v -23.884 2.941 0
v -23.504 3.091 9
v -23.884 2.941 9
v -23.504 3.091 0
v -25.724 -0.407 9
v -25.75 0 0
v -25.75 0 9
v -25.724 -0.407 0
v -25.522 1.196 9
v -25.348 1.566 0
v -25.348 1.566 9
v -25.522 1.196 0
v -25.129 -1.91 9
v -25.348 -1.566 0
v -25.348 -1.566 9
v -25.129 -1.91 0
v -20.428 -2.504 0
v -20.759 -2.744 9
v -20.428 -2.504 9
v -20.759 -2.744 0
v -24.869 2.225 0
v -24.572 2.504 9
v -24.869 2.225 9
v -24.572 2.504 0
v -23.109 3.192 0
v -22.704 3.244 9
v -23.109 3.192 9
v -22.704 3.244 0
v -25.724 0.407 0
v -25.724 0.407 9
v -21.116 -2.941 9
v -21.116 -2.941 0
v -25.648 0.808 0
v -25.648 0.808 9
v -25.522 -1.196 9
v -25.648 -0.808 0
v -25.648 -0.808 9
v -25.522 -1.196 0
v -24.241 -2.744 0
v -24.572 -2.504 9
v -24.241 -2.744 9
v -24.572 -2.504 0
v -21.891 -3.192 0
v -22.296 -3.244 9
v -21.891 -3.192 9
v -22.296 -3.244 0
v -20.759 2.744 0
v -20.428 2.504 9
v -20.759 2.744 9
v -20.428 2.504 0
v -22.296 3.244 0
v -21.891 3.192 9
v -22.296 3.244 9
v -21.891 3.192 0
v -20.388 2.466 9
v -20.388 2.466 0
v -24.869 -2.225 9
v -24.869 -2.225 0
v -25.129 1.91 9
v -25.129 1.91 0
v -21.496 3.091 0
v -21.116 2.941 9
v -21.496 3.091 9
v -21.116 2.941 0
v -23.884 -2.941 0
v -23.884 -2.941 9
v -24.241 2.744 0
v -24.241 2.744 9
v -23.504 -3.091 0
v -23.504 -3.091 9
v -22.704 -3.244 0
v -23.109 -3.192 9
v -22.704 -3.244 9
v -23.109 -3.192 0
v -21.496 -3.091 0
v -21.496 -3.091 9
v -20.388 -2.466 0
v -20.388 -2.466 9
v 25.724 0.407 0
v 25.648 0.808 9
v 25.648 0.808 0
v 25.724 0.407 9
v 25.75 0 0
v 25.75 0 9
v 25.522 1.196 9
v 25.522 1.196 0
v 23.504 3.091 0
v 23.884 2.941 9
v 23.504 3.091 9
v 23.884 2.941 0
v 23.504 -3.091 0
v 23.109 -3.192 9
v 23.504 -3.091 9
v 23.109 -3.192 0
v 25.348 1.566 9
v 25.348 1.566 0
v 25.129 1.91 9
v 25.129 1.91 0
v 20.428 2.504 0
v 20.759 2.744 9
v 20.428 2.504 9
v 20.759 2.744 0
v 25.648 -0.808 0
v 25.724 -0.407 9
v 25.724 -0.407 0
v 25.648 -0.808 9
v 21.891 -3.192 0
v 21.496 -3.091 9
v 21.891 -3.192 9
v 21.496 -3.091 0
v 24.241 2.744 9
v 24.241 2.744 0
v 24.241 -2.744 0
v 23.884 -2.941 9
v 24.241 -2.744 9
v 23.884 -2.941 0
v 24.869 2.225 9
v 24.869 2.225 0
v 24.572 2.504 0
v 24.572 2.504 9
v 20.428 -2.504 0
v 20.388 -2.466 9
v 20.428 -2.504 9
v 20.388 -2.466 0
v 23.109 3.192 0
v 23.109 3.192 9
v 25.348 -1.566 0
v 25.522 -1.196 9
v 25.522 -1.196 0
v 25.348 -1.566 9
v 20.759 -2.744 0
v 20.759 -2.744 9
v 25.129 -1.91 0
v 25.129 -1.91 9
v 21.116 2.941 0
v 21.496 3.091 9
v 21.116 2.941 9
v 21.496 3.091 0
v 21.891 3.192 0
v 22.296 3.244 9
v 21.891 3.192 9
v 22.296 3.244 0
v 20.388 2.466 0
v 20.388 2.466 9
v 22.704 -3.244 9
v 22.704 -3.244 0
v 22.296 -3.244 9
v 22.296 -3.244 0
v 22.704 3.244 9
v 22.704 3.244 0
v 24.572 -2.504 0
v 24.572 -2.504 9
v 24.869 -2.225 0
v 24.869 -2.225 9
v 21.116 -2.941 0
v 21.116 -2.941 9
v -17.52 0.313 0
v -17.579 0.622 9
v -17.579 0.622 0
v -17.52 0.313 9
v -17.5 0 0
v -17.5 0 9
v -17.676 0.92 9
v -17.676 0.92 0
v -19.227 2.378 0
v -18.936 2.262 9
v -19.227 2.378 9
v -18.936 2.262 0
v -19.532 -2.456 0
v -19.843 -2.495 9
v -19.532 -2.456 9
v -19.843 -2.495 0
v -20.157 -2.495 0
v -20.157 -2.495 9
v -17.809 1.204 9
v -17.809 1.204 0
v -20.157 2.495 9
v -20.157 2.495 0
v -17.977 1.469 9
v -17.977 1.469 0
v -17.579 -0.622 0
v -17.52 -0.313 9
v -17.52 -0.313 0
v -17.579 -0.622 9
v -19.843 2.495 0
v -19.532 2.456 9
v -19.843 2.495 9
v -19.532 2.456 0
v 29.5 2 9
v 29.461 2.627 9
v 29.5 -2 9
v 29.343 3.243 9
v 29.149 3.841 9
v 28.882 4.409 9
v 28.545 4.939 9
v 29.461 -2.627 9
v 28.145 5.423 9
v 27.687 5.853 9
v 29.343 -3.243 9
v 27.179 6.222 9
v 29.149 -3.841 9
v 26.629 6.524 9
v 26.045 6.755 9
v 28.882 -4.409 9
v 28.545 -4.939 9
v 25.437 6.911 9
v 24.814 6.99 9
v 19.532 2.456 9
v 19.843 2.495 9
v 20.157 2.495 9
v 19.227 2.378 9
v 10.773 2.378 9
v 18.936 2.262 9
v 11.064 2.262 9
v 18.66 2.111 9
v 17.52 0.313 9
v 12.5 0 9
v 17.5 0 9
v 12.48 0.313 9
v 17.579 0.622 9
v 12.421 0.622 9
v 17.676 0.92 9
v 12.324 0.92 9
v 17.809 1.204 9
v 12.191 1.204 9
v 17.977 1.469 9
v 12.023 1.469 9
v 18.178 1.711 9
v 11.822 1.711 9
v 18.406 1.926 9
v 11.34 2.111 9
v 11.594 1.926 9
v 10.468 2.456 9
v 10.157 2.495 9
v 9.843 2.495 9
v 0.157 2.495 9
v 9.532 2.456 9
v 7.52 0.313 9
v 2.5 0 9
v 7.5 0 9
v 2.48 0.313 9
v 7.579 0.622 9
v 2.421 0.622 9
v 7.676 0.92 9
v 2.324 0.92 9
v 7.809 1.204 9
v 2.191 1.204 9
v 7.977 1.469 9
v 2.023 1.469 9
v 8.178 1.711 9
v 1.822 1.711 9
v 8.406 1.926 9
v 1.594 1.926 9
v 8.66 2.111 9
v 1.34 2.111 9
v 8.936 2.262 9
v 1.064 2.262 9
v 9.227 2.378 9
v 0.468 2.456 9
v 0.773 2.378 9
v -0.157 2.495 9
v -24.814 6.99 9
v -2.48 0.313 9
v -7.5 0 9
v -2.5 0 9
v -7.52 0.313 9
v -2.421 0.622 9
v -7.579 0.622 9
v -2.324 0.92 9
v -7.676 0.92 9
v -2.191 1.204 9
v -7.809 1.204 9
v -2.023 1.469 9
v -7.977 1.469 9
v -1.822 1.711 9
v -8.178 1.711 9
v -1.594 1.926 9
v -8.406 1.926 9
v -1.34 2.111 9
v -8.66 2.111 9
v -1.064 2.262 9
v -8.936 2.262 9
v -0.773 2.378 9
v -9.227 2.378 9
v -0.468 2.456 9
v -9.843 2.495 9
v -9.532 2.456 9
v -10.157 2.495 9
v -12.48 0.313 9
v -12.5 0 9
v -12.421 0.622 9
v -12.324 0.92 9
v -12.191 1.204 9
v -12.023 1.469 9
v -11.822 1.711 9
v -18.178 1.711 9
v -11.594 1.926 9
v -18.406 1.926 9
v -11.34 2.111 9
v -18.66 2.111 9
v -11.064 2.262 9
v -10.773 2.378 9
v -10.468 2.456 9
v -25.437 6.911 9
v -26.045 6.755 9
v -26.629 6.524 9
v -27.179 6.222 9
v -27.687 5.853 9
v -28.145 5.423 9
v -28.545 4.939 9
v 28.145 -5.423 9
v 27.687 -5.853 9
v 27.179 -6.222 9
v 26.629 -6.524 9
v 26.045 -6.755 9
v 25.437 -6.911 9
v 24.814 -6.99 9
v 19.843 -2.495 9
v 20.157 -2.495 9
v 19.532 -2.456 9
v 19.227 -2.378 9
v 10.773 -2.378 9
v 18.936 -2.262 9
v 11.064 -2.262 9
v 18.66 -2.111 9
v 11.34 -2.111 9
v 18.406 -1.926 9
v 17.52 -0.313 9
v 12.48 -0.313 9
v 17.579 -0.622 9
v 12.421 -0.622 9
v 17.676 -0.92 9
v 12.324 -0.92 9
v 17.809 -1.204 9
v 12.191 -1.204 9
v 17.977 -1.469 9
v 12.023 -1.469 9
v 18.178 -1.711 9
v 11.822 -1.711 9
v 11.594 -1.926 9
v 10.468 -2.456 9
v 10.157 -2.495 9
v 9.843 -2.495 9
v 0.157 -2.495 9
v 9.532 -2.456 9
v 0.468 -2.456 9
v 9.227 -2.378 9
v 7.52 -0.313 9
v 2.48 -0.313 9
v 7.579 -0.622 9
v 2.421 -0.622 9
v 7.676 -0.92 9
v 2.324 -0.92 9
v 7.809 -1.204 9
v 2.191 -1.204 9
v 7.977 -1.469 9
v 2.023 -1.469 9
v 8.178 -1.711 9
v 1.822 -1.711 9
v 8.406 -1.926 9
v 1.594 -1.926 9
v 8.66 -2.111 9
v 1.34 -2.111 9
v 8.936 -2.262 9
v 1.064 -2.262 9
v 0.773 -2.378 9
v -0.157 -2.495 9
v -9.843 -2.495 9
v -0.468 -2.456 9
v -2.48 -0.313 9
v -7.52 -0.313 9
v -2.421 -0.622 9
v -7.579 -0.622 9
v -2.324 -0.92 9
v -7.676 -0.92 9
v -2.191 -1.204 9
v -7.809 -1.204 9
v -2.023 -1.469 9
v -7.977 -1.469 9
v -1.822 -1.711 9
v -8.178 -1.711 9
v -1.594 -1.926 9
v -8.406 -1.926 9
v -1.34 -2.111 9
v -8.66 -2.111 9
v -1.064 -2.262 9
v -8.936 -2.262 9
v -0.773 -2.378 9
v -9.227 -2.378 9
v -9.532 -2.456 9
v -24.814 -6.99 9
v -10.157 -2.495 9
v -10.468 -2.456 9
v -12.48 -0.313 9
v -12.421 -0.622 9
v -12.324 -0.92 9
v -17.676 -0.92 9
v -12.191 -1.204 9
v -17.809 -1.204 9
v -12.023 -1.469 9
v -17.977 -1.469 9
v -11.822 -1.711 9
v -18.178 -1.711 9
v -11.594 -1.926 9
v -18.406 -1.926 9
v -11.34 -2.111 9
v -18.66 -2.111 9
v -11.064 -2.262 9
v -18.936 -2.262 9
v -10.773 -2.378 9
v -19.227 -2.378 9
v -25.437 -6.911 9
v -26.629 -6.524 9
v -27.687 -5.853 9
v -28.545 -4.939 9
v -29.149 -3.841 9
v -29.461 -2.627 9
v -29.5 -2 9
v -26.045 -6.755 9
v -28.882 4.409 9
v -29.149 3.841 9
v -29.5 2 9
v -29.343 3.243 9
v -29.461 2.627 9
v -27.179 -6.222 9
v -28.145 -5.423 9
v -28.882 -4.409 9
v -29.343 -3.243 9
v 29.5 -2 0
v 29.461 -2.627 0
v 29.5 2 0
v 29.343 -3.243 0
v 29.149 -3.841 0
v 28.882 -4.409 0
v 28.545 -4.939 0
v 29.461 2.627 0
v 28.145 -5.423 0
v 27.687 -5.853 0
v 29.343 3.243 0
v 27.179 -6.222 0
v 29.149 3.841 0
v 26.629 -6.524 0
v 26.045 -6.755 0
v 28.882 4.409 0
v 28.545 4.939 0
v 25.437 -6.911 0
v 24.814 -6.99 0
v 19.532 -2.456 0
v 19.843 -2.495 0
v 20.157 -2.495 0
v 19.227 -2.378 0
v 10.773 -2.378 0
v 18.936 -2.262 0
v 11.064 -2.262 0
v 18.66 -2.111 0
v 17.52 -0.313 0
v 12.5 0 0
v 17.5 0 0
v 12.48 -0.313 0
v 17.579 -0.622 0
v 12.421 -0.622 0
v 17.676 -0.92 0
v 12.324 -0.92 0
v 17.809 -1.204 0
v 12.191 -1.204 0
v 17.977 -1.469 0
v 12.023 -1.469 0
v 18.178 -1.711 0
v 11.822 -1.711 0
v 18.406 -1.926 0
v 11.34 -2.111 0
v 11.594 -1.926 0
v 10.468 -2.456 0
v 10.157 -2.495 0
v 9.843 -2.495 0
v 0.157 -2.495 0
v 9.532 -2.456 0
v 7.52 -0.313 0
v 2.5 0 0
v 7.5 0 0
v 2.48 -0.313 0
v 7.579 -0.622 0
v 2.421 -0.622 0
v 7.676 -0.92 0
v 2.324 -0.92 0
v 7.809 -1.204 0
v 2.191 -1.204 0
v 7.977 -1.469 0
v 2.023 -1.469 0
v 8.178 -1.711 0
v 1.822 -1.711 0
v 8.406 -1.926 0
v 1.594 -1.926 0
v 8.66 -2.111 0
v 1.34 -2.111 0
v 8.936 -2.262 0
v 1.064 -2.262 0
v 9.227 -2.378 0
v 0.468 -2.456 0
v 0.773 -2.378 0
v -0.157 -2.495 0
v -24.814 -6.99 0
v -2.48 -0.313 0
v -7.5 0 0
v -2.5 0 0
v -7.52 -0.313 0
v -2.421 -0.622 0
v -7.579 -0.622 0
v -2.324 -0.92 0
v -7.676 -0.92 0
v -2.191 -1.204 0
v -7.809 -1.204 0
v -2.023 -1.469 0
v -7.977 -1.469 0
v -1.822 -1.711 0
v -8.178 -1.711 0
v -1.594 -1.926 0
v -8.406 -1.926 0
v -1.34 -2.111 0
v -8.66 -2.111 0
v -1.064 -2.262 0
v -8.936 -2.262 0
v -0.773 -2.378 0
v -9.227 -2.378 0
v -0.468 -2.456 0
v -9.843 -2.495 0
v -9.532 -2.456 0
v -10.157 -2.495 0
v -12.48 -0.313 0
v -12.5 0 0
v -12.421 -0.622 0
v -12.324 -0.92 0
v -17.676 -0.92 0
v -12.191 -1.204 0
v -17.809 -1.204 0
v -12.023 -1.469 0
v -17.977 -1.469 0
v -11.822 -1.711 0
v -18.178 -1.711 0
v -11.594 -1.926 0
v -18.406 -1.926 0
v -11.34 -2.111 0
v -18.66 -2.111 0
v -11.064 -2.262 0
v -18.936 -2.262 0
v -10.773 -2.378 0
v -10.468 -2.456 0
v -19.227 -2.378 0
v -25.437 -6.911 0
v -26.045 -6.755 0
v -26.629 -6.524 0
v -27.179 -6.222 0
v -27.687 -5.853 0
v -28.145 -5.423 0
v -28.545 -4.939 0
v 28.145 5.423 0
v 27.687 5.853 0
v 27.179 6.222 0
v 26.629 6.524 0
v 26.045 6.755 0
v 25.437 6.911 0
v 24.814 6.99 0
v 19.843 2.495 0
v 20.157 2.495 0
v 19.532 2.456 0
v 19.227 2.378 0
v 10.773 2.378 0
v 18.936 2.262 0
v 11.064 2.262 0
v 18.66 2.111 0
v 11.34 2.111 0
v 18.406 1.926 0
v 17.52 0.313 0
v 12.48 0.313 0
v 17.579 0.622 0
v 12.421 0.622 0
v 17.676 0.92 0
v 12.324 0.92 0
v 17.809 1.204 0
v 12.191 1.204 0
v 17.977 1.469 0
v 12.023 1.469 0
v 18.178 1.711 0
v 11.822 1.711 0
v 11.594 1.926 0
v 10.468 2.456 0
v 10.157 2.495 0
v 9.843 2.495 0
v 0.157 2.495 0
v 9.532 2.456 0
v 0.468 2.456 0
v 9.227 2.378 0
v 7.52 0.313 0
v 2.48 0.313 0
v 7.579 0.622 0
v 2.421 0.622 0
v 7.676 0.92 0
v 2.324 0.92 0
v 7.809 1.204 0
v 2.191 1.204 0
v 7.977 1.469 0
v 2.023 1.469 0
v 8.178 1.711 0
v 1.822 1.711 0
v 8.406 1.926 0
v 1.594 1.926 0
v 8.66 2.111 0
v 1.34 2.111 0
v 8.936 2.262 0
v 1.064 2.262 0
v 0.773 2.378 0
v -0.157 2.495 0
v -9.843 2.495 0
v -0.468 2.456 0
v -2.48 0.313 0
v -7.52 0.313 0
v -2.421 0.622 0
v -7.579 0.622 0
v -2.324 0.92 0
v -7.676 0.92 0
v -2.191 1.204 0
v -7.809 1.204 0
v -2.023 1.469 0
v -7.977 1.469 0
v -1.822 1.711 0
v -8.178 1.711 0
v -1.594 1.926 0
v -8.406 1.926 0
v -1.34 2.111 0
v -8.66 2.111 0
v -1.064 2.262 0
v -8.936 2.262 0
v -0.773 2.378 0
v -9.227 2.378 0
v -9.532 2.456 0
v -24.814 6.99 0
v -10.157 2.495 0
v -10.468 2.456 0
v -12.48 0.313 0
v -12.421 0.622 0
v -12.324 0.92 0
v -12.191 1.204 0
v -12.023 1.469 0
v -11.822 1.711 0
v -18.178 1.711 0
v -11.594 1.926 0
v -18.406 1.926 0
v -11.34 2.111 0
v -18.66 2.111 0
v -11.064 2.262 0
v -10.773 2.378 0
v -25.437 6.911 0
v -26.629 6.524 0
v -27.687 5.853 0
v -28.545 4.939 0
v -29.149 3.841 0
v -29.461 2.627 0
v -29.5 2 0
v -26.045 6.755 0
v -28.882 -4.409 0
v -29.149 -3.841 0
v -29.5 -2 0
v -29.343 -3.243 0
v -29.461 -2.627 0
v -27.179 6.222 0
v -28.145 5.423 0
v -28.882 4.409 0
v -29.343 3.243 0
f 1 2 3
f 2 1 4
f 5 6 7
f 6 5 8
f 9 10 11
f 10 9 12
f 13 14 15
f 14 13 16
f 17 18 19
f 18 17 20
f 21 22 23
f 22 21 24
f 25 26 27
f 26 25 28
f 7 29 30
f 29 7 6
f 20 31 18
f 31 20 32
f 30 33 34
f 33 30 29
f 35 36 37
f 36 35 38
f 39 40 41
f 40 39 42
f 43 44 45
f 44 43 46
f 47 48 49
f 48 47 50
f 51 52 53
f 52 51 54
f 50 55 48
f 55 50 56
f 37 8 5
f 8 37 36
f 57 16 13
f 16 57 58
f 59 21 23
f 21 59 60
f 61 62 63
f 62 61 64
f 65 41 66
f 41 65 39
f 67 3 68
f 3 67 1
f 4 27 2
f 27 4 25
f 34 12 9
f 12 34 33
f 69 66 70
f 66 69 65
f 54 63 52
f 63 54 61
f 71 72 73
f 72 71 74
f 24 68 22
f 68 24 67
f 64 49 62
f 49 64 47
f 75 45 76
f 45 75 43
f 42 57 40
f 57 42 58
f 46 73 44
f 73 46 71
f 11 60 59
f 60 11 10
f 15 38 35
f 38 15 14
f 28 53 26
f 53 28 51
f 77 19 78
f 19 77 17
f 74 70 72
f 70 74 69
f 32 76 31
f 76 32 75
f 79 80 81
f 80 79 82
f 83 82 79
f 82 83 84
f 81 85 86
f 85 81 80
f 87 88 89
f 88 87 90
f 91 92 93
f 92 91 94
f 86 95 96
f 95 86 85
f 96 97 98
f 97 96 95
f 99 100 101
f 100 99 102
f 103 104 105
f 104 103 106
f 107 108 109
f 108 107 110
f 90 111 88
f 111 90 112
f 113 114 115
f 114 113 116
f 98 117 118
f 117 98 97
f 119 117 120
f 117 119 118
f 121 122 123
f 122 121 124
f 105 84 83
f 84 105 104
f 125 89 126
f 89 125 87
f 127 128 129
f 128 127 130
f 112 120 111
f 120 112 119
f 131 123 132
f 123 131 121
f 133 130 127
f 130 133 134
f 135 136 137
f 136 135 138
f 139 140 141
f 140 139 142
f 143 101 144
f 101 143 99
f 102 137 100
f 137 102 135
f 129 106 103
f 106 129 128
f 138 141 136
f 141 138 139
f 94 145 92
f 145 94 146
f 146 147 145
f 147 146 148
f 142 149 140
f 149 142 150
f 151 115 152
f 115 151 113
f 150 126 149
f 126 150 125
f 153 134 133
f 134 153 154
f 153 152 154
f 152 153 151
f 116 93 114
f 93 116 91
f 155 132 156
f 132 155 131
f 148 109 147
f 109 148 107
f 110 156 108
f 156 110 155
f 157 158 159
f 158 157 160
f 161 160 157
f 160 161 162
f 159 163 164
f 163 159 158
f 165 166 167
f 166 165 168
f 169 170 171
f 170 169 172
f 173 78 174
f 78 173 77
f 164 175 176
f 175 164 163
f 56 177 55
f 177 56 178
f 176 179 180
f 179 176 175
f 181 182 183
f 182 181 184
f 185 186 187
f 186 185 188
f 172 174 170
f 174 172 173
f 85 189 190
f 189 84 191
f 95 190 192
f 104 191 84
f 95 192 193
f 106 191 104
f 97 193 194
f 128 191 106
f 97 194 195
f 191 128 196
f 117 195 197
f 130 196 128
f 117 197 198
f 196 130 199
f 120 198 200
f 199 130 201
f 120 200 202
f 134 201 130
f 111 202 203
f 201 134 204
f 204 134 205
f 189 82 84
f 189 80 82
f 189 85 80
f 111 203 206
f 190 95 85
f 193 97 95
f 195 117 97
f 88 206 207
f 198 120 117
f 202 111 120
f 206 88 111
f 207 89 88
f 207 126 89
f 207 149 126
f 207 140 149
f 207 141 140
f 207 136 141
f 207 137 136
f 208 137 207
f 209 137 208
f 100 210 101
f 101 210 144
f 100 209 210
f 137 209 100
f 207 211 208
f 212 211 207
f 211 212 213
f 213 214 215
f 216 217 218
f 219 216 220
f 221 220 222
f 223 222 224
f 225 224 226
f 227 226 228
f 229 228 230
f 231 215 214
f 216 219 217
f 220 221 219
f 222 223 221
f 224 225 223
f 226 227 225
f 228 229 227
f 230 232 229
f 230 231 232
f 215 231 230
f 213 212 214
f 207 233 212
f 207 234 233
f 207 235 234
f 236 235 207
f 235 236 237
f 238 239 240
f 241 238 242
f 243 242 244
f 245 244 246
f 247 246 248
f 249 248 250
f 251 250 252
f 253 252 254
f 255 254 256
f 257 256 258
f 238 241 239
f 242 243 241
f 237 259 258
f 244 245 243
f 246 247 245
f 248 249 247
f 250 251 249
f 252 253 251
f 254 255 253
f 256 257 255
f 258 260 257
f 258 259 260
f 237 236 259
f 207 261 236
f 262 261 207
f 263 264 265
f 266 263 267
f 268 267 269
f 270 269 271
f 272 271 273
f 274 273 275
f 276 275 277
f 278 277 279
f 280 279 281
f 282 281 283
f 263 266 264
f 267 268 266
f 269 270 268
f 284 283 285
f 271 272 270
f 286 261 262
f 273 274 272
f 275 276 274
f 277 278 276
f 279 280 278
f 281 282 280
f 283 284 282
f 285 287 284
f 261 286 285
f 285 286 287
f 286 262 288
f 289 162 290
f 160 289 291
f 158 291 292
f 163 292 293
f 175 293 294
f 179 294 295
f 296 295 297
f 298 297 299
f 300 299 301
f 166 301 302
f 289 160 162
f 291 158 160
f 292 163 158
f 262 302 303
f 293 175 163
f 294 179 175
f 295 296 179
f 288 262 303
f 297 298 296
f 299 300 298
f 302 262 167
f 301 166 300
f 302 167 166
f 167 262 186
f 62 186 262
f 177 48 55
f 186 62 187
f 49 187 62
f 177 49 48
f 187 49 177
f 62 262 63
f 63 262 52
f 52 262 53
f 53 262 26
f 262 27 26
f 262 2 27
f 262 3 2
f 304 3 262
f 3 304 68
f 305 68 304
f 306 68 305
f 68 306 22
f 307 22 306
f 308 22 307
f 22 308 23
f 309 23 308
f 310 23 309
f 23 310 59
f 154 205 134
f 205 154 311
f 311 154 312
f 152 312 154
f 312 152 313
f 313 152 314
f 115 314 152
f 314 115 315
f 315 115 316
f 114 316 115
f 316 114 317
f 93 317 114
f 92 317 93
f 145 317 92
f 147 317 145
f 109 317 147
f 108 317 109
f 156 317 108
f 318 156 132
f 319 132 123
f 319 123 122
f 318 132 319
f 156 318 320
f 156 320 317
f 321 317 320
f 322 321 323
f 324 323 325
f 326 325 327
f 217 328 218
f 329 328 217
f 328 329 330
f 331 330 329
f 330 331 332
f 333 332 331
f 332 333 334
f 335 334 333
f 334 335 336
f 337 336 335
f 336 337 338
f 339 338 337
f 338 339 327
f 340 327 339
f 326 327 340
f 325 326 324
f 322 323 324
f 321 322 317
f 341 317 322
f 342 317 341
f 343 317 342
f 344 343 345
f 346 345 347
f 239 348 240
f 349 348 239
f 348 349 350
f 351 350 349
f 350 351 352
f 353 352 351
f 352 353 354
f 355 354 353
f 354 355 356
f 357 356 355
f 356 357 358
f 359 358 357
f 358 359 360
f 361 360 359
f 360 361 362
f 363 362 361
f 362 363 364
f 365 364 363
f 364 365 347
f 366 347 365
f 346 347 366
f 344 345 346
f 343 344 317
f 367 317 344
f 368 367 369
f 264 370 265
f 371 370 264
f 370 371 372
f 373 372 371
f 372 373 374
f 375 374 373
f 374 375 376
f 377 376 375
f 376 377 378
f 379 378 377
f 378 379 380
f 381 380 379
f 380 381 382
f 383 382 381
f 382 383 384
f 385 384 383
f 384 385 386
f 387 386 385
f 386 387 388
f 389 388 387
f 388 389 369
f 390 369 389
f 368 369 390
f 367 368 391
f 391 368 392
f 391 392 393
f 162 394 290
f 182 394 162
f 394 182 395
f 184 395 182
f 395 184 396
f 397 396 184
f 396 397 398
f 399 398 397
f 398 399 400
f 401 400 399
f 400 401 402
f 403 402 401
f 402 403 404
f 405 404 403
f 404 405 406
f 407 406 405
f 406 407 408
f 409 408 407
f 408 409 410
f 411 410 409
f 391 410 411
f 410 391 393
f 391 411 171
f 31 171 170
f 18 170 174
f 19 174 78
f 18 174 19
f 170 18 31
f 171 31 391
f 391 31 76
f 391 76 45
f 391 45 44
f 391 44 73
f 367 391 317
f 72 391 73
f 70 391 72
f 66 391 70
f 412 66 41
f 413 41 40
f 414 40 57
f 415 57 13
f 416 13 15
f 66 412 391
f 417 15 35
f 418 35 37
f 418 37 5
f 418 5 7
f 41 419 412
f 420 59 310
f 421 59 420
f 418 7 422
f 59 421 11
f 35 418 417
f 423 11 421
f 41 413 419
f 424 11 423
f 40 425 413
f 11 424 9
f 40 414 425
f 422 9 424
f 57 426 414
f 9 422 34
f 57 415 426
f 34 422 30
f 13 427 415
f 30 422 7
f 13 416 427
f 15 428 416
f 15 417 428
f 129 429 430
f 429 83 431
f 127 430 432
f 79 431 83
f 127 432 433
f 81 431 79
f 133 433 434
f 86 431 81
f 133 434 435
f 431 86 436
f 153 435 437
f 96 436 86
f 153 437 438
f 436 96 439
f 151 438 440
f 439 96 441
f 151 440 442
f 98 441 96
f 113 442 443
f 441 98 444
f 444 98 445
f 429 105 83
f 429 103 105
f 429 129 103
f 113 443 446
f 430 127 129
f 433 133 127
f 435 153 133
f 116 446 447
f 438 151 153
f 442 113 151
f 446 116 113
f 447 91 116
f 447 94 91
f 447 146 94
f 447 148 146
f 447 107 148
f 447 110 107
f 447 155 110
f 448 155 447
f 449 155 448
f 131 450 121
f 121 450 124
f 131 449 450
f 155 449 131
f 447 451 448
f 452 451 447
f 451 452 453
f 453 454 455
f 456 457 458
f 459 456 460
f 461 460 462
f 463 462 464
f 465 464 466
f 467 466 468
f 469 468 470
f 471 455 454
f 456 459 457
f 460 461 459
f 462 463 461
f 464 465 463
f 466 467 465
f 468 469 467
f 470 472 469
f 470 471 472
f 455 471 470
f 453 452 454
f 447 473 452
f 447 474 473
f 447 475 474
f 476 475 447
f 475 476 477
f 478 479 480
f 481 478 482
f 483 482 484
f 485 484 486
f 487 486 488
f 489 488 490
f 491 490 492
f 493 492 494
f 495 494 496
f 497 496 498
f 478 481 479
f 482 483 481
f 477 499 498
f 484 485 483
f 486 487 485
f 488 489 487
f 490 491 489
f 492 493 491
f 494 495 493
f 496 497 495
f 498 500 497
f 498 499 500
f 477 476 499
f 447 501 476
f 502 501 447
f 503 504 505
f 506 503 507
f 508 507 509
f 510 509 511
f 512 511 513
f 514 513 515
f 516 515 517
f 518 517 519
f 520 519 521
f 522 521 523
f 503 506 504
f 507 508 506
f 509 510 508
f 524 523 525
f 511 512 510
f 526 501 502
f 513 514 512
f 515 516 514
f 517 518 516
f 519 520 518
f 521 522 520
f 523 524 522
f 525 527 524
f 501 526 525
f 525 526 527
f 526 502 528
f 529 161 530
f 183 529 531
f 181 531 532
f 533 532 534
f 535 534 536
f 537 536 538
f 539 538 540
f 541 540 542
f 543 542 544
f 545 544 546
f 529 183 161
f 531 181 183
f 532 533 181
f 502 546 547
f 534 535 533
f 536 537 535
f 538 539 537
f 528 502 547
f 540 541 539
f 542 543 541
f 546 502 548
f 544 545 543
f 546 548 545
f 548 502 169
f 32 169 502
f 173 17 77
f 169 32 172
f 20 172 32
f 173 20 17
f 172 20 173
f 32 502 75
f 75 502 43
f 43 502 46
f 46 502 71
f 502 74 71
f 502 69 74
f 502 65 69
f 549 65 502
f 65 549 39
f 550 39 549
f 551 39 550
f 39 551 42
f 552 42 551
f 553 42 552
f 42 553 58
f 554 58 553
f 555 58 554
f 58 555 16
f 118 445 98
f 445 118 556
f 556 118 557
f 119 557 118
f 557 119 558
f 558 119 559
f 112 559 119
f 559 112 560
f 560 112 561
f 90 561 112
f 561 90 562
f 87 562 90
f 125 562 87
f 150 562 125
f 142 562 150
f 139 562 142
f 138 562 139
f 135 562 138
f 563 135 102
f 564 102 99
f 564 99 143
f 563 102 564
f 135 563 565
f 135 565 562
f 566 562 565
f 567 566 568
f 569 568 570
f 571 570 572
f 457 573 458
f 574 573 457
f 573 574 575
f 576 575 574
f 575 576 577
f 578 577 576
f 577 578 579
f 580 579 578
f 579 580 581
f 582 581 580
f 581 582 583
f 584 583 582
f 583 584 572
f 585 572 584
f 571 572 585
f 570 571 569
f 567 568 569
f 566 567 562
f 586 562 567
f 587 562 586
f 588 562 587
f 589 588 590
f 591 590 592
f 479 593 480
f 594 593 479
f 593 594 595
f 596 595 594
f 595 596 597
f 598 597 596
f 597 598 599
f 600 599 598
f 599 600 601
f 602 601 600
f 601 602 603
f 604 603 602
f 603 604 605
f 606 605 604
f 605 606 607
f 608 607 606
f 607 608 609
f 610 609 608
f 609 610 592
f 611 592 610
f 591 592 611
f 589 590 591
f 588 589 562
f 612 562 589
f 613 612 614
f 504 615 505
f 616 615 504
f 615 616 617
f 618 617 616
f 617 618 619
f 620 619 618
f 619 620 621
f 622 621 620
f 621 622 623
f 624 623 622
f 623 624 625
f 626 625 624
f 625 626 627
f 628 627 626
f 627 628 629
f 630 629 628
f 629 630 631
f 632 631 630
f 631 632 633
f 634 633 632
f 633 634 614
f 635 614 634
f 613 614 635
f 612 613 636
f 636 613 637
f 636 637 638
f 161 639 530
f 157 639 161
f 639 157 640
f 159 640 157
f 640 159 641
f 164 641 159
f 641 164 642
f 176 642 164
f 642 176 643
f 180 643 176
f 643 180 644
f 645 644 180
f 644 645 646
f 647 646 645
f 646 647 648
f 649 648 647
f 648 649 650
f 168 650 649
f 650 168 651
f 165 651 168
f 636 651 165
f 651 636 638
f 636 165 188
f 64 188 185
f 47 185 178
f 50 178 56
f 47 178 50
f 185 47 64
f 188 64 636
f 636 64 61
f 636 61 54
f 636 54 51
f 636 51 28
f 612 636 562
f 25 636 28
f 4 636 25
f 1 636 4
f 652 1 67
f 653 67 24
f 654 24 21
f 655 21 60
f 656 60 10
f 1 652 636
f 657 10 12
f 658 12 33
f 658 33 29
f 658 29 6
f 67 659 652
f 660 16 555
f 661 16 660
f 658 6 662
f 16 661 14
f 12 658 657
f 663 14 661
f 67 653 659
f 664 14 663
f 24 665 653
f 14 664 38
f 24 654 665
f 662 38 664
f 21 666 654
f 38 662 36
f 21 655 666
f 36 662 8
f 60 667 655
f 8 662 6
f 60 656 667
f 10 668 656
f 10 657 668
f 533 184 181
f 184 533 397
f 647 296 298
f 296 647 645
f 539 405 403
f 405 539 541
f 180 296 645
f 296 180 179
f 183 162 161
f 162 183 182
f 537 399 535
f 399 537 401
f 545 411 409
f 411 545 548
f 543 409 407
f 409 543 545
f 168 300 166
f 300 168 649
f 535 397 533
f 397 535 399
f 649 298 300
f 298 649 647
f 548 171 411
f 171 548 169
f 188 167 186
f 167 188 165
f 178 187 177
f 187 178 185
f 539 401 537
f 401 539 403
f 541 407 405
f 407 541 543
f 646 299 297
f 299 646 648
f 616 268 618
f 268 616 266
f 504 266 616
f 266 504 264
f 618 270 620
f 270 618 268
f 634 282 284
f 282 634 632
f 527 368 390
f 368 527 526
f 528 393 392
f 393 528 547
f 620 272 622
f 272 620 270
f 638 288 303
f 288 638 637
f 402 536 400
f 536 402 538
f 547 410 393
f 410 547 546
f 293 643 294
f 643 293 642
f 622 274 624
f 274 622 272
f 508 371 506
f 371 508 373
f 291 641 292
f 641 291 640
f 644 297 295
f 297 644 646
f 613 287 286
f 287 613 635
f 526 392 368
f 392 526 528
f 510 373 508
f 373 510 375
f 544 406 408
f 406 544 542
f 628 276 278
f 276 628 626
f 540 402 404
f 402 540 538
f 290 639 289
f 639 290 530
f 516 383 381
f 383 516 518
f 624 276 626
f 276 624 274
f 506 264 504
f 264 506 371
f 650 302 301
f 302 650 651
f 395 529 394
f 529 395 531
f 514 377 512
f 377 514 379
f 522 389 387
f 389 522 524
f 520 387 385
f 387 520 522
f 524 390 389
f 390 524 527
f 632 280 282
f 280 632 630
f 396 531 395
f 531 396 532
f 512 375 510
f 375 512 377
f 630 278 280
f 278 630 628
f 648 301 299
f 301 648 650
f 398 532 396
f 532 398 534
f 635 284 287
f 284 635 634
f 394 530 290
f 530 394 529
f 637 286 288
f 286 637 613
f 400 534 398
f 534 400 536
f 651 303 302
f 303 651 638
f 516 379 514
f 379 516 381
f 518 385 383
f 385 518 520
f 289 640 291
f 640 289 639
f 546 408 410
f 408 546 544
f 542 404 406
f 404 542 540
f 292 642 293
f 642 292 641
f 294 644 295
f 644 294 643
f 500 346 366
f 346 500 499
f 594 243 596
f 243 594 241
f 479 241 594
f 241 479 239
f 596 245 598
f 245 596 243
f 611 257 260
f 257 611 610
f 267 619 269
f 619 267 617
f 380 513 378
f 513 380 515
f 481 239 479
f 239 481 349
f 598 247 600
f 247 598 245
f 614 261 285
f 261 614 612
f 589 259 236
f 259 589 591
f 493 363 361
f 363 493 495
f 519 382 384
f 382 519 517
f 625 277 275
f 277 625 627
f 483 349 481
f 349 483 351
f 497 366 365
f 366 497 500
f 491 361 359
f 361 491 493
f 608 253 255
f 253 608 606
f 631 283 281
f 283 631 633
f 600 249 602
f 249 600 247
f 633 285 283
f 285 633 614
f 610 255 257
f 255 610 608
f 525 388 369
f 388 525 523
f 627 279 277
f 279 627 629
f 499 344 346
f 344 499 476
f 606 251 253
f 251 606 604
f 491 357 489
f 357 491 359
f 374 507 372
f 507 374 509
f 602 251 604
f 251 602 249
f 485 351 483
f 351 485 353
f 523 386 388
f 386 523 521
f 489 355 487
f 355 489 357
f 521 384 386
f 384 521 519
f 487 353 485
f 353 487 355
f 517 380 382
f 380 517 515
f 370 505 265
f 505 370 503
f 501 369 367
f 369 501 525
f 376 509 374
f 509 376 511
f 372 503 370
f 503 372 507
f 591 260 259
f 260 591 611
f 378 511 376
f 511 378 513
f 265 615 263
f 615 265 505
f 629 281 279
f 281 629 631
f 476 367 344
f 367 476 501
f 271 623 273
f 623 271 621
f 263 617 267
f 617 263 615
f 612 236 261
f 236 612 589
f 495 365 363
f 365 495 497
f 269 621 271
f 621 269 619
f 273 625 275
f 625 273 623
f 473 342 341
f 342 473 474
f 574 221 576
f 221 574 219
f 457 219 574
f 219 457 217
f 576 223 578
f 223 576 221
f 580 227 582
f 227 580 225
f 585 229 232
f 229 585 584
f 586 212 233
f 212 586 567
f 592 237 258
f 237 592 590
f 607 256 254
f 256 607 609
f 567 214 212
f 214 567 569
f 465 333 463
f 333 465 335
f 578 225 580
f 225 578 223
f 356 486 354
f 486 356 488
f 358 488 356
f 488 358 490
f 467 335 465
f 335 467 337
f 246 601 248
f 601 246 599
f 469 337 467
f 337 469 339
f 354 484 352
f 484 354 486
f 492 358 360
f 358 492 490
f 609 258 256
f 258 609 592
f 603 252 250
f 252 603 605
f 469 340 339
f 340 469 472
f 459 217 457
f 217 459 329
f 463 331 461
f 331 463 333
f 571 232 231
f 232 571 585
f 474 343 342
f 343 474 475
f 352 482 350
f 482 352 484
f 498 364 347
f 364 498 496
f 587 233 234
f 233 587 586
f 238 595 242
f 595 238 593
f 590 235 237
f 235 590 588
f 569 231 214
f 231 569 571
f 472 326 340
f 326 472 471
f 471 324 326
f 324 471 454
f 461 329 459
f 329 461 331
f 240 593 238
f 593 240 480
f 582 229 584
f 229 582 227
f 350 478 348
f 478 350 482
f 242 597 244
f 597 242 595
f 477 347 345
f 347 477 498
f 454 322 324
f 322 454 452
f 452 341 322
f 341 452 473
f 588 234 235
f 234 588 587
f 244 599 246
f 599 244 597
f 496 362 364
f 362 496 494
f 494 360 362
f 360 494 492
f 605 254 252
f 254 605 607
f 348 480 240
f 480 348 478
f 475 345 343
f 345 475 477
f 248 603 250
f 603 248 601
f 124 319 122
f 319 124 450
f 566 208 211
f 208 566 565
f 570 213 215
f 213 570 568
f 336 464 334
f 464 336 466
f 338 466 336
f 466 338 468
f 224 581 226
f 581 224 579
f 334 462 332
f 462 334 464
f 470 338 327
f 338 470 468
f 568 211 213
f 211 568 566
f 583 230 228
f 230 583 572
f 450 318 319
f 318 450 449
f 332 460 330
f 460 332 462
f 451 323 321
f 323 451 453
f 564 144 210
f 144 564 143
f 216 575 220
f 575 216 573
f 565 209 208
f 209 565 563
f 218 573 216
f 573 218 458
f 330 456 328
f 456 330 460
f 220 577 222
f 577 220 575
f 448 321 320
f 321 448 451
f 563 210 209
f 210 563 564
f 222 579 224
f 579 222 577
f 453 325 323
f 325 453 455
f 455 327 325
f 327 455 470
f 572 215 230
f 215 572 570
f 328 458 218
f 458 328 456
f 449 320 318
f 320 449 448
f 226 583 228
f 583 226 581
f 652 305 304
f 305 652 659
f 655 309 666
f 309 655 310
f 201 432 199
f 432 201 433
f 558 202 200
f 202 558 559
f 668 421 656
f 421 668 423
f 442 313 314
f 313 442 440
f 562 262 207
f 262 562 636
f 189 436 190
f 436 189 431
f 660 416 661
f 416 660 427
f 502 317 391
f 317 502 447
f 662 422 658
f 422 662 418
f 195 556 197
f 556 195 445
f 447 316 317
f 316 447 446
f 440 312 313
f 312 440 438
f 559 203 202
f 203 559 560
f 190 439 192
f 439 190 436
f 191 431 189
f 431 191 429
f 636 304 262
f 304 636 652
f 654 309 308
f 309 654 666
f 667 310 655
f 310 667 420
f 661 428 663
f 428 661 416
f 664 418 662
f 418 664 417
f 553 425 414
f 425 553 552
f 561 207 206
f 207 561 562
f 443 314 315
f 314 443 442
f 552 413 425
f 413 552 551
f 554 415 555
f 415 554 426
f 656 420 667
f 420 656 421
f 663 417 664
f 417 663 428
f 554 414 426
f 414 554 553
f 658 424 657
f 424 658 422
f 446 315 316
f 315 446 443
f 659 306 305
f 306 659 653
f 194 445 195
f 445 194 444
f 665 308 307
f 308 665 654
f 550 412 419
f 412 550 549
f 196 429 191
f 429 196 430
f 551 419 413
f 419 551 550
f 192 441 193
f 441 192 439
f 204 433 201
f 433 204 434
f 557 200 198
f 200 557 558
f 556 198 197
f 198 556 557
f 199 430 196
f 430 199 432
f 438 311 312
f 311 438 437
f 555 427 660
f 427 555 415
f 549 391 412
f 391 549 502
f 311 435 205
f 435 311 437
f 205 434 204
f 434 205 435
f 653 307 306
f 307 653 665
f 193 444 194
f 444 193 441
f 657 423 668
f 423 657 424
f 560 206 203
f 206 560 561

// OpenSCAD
$fn = 50;

difference() {
	union() {
		hull() {
			translate(v = [-24.5, 2.0, 0]) {
				cylinder(h = 9, r = 5);
			}
			translate(v = [24.5, 2.0, 0]) {
				cylinder(h = 9, r = 5);
			}
			translate(v = [-24.5, -2.0, 0]) {
				cylinder(h = 9, r = 5);
			}
			translate(v = [24.5, -2.0, 0]) {
				cylinder(h = 9, r = 5);
			}
		}
	}
	union() {
		translate(v = [-22.5, 0.0, -100.0]) {
			cylinder(h = 200, r = 3.25);
		}
		translate(v = [22.5, 0.0, -100.0]) {
			cylinder(h = 200, r = 3.25);
		}
		translate(v = [-22.5, 0.0, -100.0]) {
			cylinder(h = 200, r = 1.8);
		}
		translate(v = [22.5, 0.0, -100.0]) {
			cylinder(h = 200, r = 1.8);
		}
		translate(v = [-20.0, 0, 0.0]) {
			cylinder(h = 9, r = 2.5);
		}
		translate(v = [-10.0, 0, 0.0]) {
			cylinder(h = 9, r = 2.5);
		}
		cylinder(h = 9, r = 2.5);
		translate(v = [10.0, 0, 0.0]) {
			cylinder(h = 9, r = 2.5);
		}
		translate(v = [20.0, 0, 0.0]) {
			cylinder(h = 9, r = 2.5);
		}
	}
}
